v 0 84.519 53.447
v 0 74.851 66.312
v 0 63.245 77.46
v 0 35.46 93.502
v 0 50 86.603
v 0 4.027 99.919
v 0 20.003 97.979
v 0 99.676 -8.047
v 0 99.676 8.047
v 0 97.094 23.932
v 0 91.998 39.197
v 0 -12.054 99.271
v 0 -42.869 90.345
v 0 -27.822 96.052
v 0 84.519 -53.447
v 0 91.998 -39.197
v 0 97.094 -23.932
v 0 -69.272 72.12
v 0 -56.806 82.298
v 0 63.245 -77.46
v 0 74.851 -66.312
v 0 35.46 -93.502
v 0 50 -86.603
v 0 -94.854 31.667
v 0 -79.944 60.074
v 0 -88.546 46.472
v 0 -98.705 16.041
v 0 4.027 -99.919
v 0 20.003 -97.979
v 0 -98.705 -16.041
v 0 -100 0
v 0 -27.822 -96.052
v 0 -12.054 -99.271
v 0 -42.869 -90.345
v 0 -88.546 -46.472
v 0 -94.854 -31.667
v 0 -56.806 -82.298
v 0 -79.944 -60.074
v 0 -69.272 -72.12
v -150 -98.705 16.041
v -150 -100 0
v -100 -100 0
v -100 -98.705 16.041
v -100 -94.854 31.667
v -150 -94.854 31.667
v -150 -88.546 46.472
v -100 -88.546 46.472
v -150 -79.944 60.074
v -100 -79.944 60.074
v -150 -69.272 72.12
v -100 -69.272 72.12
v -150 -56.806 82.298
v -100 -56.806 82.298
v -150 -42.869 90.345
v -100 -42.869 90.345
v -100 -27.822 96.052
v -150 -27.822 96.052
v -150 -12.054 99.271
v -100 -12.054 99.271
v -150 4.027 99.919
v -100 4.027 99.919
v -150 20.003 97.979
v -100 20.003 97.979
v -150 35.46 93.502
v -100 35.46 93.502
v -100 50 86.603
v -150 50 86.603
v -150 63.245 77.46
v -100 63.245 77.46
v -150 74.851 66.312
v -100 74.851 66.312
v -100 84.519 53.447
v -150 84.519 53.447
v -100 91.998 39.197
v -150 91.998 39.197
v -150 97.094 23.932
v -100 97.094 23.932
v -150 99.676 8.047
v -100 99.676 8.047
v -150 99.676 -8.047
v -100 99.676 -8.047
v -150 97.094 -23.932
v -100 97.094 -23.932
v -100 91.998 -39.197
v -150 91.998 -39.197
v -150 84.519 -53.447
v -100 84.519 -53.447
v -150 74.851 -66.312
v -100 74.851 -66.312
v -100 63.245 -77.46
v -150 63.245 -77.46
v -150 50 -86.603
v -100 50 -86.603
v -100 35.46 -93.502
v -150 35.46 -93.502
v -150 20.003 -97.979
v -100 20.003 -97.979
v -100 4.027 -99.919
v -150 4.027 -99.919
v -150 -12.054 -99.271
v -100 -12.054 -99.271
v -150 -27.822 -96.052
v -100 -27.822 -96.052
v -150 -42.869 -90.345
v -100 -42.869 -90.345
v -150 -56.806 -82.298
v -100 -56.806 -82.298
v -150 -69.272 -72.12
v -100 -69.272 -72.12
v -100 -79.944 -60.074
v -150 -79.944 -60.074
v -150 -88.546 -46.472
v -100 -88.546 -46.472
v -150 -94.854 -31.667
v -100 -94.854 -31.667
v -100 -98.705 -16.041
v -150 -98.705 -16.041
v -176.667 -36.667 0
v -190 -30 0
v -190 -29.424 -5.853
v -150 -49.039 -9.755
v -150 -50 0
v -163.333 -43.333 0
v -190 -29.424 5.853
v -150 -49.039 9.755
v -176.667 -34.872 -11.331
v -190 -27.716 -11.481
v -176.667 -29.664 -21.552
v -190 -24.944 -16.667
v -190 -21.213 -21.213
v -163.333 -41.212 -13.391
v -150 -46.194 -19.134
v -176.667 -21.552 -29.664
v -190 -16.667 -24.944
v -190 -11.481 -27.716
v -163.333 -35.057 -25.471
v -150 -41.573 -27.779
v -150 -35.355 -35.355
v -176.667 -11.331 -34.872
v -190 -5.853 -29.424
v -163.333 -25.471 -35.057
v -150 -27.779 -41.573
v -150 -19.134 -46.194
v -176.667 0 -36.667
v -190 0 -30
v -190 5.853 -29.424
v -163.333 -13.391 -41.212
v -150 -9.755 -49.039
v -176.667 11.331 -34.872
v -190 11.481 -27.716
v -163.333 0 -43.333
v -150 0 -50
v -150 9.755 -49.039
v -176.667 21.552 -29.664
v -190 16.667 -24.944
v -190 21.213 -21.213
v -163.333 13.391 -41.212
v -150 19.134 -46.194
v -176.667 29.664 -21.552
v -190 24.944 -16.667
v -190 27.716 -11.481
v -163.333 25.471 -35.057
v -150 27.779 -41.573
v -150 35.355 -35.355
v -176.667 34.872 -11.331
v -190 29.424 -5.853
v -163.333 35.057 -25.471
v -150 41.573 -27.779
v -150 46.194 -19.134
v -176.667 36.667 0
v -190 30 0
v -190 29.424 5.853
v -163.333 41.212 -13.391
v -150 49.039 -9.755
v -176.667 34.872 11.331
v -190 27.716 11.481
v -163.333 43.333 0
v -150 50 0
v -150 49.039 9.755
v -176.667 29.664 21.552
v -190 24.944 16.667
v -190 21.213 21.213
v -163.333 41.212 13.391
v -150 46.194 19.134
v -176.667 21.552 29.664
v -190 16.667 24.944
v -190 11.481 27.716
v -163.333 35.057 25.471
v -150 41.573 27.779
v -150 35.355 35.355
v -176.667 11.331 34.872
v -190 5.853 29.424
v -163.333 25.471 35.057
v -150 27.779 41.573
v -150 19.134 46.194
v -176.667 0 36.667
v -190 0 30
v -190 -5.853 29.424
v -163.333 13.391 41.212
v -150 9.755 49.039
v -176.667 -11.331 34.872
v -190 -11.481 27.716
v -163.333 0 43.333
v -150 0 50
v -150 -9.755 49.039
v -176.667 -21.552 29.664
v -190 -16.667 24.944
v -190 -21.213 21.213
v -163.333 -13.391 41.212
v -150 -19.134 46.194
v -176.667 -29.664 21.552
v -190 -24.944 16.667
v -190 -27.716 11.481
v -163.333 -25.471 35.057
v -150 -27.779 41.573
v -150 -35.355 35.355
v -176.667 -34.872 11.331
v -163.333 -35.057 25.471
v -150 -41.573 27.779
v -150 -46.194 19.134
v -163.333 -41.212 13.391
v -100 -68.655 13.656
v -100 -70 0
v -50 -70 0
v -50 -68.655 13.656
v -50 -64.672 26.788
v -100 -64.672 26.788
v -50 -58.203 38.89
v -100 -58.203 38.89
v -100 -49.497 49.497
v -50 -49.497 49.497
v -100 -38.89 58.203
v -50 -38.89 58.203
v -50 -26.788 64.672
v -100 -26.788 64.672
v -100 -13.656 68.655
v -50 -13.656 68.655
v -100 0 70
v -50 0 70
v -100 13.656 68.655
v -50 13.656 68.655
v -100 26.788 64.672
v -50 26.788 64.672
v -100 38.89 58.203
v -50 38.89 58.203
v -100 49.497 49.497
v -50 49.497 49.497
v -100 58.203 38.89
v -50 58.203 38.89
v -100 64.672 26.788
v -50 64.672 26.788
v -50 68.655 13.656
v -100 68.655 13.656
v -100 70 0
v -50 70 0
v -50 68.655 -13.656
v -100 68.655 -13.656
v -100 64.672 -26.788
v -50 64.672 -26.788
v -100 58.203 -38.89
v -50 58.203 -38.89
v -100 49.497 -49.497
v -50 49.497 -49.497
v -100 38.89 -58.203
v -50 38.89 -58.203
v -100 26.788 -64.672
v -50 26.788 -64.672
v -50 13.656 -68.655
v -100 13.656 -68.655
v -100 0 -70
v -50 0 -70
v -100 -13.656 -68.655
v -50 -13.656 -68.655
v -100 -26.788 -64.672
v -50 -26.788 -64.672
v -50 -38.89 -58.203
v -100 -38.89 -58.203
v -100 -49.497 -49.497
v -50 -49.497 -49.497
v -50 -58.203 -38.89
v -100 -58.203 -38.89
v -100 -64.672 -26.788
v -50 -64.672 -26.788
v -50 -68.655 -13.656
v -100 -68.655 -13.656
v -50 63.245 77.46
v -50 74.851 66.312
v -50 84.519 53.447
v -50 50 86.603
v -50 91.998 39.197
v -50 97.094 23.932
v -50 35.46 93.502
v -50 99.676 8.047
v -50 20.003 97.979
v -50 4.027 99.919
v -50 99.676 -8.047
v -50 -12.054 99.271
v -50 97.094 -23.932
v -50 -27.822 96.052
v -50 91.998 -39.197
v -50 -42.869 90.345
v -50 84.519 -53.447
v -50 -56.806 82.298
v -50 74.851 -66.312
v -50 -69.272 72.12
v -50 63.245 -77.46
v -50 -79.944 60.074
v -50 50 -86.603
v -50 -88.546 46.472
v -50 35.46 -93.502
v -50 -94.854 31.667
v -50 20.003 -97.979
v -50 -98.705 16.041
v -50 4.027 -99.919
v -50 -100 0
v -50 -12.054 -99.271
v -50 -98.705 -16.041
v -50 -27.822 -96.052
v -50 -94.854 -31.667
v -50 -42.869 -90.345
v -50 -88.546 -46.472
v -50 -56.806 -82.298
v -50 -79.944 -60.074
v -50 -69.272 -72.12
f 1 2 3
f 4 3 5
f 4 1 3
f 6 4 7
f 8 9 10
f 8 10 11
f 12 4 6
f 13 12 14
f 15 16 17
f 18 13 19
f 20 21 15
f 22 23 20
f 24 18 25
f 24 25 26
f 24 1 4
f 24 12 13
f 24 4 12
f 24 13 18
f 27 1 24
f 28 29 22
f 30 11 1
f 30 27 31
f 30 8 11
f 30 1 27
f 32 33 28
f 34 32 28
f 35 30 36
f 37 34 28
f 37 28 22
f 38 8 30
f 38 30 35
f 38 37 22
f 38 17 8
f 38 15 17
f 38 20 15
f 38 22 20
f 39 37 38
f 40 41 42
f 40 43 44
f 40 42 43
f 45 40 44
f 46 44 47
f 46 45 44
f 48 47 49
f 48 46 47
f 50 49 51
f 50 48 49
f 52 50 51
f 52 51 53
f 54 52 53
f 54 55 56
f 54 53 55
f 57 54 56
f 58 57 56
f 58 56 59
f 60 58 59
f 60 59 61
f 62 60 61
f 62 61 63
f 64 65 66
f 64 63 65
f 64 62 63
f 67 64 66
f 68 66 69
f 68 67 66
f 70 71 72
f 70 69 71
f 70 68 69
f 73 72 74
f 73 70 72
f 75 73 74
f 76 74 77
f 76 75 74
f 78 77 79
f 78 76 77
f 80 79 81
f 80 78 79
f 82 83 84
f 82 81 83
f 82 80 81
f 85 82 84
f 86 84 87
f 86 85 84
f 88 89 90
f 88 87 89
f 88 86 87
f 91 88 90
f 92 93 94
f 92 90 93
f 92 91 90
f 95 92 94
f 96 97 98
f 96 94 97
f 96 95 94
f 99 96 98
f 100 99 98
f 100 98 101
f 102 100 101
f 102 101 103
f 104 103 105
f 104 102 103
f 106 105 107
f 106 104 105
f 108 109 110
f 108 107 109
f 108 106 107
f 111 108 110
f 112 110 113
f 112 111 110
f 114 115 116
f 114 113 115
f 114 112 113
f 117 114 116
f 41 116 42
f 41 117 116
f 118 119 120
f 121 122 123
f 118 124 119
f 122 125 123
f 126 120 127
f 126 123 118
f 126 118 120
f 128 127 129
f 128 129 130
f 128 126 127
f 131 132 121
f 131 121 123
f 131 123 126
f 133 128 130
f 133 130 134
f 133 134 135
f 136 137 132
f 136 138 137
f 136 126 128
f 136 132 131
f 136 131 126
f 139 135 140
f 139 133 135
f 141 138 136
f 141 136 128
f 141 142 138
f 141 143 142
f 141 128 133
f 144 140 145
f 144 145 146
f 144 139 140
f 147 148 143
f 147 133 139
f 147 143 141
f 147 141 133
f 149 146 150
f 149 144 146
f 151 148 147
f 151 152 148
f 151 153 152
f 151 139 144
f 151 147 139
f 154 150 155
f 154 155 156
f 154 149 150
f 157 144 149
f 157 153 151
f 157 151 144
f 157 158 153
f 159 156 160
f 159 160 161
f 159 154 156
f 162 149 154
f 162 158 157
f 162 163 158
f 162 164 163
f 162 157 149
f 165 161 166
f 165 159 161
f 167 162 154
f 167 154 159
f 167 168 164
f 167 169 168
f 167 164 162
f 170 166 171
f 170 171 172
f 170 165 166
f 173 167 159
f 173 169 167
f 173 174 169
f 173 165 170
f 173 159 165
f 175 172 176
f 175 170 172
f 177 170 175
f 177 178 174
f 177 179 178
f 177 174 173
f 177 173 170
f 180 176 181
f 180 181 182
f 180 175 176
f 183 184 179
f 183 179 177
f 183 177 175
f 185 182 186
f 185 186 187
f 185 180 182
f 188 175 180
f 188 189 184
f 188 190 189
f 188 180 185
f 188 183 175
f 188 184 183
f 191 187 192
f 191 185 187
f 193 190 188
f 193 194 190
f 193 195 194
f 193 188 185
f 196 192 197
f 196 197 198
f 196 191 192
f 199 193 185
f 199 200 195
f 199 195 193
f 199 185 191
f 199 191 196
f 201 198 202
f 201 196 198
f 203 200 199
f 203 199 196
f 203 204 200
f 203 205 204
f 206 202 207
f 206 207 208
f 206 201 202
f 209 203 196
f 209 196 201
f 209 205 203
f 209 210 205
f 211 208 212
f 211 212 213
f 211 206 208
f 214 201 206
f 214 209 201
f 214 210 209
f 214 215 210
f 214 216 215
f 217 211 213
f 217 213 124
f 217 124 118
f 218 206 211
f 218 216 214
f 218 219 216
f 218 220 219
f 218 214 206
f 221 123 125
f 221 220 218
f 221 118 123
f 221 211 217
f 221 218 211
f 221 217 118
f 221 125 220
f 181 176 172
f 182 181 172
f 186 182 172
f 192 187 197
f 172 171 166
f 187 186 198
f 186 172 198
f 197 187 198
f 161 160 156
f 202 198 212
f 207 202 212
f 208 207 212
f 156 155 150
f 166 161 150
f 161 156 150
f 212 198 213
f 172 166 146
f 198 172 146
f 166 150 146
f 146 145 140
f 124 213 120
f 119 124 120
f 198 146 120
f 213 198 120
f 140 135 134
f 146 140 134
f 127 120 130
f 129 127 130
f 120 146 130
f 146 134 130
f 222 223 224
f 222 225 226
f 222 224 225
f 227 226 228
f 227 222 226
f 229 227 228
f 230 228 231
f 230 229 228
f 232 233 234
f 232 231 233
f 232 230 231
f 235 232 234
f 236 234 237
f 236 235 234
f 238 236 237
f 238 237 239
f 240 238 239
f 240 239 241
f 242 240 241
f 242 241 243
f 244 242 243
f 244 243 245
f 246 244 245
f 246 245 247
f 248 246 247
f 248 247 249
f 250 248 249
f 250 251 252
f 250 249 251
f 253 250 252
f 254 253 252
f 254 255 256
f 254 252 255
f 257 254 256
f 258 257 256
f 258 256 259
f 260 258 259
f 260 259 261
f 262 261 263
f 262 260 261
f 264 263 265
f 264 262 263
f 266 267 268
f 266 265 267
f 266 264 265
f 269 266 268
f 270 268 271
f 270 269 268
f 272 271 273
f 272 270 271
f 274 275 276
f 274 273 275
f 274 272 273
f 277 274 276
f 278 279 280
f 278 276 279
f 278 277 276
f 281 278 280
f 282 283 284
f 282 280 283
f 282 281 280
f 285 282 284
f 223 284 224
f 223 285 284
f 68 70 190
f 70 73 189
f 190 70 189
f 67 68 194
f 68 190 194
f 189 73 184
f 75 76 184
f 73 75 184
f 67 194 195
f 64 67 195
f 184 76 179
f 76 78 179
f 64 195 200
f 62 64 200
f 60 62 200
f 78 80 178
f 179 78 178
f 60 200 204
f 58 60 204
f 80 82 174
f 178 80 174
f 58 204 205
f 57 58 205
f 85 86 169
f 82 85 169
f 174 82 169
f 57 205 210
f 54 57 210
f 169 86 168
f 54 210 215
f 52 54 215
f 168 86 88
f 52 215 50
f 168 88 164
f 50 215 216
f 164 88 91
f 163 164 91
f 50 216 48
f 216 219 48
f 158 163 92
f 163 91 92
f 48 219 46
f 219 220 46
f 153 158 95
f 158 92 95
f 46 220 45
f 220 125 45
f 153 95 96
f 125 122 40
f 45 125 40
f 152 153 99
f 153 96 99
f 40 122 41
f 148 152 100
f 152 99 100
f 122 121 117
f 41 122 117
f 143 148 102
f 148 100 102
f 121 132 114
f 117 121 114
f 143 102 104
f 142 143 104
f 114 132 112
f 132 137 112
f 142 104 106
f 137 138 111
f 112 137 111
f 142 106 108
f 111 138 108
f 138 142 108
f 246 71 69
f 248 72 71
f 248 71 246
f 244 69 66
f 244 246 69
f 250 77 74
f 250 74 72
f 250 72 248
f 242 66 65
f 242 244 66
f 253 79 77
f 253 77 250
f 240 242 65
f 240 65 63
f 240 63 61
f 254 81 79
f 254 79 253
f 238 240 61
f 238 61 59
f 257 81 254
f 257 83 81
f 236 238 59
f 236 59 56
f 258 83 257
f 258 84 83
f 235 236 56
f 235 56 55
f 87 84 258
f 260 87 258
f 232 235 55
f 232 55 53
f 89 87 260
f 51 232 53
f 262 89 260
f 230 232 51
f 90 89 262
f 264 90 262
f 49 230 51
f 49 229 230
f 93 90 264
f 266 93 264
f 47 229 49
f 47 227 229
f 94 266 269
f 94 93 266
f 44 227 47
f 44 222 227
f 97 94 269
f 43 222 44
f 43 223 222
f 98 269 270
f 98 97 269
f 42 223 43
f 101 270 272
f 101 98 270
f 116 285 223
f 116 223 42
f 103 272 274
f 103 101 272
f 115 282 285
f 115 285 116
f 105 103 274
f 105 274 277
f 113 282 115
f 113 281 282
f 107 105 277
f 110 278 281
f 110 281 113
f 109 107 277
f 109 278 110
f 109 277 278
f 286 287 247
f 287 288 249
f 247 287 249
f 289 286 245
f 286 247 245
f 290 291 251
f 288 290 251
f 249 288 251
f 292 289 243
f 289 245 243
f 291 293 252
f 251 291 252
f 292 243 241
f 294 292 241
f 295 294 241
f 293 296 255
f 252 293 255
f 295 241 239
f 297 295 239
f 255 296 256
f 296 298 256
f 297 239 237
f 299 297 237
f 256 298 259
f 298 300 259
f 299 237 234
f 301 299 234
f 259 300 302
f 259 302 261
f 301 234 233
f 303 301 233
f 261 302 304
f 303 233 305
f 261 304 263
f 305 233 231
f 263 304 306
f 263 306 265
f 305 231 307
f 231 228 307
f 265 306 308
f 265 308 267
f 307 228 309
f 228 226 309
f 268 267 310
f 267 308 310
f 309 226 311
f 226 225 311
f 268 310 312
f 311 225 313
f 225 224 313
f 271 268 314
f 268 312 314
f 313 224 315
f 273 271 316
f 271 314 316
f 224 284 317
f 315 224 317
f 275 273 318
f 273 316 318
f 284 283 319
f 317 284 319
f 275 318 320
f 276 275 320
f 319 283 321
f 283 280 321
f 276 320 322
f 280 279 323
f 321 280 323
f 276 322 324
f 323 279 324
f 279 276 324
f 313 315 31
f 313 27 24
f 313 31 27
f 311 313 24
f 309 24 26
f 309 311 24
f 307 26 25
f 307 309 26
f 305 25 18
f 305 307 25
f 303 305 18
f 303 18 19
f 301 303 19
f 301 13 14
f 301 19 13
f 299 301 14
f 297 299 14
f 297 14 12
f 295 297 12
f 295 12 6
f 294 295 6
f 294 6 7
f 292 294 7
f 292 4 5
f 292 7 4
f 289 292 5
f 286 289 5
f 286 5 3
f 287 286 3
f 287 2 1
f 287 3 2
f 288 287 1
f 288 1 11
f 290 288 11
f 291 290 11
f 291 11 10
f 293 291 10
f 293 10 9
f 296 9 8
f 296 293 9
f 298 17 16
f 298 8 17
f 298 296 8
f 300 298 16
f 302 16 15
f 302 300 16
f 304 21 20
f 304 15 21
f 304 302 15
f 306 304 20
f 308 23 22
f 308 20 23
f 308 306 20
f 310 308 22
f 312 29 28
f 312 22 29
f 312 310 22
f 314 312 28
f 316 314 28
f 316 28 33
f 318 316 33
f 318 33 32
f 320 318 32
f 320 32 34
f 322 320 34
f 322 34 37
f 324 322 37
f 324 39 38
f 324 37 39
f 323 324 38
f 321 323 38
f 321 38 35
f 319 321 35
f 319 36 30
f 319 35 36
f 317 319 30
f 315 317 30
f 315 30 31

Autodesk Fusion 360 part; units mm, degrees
sketch "Sketch1" plane through (0, 0, 0) normal (0, 0, 1) x (1, 0, 0)
  line L0 (0, 0) -> (0, -100)
  line L1 (0, -100) -> (-50, -100)
  line L2 (-100, -100) -> (-150, -100)
  line L3 (-150, -100) -> (-150, -50)
  line L4 (-150, -50) -> (-190, -30)
  line L5 (-190, -30) -> (-190, 0)
  line L6 (-190, 0) -> (0, 0)
  line L7 (-50, -100) -> (-50, -70)
  line L8 (-50, -70) -> (-100, -70)
  line L9 (-100, -70) -> (-100, -100)
revolve "Revolve1" add sketch "Sketch1" angle 360 about axis through (-190, 0, 0) along (1, 0, 0)
